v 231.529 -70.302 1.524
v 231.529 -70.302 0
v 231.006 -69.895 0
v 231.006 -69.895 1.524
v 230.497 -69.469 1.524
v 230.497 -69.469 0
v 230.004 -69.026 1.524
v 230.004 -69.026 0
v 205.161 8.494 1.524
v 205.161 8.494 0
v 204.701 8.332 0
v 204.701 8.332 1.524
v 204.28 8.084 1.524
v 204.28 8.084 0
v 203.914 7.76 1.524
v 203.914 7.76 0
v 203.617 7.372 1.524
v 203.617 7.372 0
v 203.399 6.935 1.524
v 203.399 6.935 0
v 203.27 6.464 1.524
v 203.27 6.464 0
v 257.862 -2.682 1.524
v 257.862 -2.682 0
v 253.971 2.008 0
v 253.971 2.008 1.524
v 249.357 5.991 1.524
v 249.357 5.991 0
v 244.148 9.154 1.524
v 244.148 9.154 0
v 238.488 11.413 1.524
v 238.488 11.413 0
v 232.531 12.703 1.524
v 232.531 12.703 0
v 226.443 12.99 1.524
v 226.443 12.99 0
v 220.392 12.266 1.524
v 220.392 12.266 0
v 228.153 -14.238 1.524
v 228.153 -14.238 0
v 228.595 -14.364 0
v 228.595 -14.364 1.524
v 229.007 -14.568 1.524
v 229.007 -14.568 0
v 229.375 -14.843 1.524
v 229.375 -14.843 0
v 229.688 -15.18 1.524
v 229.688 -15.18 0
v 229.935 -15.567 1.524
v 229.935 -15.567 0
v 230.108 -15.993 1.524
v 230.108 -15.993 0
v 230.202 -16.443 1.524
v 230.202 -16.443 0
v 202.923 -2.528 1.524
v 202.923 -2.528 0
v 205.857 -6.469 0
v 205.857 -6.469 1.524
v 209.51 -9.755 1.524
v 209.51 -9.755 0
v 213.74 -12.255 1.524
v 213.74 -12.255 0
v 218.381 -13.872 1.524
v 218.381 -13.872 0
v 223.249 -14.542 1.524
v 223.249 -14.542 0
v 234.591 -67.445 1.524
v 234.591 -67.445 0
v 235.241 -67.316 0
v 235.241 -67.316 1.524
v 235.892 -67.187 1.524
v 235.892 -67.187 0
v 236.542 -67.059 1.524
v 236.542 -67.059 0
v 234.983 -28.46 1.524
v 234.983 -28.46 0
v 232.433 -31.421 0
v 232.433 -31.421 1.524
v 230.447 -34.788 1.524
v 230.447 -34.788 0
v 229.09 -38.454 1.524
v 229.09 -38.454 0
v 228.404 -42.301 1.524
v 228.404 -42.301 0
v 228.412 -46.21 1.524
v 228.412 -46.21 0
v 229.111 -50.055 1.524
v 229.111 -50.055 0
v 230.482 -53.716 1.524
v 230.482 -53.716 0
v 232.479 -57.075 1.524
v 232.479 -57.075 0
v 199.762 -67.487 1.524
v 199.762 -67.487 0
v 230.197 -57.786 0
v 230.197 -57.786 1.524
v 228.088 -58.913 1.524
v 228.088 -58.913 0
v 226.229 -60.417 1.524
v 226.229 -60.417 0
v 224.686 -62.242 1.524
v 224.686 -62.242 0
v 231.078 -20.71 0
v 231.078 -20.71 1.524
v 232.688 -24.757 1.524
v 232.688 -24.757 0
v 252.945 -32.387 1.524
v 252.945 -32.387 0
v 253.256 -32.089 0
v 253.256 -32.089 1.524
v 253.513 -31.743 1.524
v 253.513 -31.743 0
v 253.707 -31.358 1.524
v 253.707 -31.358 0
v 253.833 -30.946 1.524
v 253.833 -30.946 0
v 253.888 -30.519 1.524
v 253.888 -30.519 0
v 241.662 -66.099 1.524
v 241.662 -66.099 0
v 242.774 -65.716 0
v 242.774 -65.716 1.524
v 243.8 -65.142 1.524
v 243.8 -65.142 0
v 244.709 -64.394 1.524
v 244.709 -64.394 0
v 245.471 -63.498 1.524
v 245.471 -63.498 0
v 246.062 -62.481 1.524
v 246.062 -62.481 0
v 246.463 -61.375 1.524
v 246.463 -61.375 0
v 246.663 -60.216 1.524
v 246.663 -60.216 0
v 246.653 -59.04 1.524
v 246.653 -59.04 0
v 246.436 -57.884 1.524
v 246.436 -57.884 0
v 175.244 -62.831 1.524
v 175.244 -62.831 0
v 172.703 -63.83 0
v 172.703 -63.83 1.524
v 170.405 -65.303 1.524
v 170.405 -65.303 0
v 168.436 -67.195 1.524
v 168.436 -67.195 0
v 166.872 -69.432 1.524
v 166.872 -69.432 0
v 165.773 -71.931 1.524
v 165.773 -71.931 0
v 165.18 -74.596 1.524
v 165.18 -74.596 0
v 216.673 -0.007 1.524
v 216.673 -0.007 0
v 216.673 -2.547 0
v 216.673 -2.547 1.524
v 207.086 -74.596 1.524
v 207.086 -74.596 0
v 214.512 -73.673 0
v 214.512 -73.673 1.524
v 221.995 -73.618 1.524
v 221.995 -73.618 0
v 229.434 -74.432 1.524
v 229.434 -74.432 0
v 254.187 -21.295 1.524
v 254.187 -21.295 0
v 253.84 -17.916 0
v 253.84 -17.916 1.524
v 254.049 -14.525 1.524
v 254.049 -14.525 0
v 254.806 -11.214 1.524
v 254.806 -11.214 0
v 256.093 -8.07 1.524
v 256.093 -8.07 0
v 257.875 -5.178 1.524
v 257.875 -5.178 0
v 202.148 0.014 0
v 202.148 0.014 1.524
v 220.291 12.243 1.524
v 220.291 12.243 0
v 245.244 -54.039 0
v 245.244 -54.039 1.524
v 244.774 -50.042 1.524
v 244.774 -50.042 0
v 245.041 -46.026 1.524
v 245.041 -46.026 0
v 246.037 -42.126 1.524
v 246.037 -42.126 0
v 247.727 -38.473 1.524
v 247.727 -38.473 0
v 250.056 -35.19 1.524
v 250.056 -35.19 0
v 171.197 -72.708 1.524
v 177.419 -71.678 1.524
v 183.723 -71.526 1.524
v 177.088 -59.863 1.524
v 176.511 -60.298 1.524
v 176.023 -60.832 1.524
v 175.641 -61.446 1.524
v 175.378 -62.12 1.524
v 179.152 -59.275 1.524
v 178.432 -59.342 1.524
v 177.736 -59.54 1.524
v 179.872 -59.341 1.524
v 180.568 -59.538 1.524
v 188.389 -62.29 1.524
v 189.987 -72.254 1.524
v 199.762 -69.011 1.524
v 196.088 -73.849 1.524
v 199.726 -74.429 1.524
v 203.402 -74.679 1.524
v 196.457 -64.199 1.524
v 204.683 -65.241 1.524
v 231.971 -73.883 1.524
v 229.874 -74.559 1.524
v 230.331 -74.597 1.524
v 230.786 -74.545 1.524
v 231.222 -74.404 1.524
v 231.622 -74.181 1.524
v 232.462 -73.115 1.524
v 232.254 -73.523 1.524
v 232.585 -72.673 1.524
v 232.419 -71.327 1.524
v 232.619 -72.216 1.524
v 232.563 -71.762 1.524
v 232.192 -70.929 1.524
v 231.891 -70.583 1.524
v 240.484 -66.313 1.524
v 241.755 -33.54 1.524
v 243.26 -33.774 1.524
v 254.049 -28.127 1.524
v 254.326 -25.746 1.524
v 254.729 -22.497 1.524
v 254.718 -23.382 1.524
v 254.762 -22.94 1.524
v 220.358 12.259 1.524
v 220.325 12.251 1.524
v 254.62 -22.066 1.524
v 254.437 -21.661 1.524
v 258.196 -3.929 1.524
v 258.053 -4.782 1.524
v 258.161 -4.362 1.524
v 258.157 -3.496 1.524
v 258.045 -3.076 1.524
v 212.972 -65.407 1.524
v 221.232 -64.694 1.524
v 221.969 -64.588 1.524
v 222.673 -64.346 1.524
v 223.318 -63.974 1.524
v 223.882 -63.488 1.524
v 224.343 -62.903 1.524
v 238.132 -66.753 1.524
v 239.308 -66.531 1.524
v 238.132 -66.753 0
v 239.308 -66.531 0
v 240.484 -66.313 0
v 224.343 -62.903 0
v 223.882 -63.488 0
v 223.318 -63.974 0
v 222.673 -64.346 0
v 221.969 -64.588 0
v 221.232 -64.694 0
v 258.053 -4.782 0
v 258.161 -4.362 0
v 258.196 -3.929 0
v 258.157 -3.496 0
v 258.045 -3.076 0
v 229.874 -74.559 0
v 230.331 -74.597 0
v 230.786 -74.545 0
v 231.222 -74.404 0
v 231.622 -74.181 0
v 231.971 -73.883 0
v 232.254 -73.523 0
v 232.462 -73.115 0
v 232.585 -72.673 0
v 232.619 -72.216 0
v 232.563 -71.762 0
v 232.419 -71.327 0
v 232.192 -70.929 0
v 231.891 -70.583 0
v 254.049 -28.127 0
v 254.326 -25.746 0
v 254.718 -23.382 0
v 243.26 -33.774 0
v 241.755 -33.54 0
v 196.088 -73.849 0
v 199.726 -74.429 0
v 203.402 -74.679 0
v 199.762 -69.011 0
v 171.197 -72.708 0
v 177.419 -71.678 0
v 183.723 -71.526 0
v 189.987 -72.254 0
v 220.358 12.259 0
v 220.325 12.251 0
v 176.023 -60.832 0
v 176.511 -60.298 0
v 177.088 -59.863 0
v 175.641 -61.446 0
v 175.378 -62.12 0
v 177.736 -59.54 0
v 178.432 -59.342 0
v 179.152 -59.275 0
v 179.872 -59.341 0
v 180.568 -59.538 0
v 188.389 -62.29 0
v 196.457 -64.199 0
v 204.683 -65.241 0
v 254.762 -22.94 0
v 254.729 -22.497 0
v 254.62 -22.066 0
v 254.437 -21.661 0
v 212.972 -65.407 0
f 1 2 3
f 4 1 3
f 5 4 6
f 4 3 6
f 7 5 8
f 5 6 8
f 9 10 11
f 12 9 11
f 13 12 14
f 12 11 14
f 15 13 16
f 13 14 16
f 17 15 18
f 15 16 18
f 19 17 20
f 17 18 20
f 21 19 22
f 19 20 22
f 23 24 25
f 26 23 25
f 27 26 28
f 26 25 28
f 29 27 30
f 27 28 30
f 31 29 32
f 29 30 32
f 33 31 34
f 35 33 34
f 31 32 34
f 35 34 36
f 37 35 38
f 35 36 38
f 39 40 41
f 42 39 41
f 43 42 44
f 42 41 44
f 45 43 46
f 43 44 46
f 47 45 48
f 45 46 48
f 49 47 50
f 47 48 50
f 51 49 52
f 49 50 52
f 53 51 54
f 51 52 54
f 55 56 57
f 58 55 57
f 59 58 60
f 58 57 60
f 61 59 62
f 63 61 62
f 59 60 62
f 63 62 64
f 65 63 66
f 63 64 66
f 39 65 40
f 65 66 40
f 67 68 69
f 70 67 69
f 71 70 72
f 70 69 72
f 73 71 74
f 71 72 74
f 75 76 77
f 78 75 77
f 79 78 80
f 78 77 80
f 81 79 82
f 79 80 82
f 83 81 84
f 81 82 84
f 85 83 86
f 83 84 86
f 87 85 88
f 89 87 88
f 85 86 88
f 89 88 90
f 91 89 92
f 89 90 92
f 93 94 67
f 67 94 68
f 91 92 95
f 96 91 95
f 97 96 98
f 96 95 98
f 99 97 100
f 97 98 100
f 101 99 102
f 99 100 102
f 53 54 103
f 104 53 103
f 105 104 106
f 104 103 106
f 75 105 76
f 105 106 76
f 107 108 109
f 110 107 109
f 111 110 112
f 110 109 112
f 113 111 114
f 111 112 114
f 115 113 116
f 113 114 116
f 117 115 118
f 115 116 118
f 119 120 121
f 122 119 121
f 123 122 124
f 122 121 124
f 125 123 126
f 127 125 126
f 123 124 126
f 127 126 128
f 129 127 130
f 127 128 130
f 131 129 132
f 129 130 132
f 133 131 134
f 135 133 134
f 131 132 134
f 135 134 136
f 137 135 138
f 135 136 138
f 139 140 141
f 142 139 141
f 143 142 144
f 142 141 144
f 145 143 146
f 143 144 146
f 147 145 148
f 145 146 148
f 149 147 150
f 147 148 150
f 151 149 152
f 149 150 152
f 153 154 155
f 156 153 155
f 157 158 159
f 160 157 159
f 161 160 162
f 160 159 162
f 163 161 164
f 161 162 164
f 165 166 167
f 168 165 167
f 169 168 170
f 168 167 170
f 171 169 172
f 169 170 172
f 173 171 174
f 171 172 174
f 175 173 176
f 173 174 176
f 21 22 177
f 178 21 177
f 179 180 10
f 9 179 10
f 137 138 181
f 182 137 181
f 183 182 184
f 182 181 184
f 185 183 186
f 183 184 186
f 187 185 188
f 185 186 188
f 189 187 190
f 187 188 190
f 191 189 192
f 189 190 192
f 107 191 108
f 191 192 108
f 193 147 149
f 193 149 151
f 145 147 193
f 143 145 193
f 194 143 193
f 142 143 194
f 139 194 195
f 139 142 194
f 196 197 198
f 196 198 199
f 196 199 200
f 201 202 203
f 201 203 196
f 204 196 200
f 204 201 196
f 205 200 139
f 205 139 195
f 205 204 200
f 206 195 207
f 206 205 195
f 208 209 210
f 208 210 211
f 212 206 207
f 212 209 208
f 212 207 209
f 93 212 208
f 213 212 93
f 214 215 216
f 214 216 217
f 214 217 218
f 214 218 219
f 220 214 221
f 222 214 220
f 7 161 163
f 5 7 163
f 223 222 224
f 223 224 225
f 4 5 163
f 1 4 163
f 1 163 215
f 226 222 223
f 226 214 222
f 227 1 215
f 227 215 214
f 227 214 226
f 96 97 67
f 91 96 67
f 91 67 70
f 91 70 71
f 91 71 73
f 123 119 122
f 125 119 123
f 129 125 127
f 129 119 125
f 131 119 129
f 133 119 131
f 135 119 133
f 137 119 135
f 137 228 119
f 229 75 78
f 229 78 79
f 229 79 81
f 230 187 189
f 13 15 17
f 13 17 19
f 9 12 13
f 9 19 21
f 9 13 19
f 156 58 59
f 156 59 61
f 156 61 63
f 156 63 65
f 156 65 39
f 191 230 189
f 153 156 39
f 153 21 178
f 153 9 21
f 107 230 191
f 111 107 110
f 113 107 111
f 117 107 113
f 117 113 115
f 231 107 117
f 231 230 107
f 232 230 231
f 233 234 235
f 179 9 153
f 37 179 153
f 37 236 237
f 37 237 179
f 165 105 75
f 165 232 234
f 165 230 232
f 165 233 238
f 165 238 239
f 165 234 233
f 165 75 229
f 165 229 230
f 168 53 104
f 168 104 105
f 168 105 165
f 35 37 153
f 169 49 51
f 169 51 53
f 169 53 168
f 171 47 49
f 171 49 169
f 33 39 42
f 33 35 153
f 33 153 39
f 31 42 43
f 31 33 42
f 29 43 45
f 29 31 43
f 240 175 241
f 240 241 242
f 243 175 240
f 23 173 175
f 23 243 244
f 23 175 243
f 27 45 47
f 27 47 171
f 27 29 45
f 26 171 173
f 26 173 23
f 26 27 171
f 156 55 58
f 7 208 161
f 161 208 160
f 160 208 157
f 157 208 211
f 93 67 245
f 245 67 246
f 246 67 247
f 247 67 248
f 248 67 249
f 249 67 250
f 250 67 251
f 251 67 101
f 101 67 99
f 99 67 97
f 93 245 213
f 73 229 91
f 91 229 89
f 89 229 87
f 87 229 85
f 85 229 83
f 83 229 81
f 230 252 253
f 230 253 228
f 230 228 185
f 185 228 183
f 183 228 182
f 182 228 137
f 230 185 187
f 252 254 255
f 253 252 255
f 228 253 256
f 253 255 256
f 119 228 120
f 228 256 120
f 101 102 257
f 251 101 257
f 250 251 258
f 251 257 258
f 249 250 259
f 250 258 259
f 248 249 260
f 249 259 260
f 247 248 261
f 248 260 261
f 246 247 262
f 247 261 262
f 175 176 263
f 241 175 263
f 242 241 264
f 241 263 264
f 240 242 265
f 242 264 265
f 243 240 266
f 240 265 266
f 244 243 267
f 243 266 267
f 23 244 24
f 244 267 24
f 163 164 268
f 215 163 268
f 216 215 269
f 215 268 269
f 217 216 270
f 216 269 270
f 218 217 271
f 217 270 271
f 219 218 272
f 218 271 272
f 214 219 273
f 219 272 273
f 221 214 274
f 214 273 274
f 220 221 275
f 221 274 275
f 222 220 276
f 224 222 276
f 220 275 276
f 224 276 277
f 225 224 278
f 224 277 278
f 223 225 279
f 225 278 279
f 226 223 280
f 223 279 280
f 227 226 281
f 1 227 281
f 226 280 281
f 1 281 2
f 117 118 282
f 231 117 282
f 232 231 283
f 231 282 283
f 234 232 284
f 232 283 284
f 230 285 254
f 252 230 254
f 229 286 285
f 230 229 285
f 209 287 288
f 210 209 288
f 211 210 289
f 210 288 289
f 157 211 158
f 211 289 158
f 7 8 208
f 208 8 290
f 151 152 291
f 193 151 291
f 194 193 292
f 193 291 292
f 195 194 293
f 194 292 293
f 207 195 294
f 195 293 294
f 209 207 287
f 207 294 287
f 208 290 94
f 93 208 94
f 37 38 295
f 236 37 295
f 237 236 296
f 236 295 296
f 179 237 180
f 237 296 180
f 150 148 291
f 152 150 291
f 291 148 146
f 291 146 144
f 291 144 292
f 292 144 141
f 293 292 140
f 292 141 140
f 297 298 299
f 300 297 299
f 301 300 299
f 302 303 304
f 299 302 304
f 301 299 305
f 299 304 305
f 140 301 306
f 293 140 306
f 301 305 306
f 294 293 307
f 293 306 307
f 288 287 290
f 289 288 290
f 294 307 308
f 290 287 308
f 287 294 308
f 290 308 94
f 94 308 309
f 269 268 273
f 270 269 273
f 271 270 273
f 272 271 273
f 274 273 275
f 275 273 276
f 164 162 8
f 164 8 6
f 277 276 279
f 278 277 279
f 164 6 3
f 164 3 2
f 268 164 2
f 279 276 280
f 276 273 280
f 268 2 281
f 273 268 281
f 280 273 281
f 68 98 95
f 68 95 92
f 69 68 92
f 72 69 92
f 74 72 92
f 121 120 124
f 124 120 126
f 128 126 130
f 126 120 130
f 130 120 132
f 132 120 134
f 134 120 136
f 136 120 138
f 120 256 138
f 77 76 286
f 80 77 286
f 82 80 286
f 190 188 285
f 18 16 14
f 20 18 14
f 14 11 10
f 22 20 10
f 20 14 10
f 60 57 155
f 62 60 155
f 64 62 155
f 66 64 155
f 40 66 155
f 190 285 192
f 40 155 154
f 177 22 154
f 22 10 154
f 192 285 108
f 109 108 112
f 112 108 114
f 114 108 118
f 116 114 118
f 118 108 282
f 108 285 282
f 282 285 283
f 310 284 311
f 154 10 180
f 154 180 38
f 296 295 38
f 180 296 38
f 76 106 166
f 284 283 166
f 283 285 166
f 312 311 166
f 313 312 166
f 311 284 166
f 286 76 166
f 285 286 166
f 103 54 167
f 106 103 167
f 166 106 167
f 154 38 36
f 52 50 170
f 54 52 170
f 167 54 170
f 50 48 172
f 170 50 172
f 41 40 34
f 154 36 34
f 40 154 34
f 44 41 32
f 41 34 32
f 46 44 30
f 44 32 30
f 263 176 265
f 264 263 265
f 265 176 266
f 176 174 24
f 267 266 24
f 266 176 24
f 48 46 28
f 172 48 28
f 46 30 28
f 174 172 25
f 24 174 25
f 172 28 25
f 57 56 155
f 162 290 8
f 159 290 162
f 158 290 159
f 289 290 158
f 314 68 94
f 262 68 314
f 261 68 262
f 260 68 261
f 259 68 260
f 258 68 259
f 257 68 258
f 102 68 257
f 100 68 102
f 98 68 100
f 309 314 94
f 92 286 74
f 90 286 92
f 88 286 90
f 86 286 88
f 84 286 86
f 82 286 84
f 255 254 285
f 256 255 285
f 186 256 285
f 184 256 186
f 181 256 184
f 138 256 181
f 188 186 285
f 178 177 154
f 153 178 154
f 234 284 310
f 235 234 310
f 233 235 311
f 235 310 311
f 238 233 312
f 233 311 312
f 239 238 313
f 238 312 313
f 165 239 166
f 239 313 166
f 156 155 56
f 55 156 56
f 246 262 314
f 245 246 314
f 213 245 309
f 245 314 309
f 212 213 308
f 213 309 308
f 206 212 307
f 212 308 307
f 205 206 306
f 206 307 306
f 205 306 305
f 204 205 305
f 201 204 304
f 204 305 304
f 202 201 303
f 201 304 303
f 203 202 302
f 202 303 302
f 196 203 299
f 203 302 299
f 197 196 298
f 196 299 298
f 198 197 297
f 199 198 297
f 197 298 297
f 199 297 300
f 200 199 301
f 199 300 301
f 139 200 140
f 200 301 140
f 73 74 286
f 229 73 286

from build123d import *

# Parameters (mm, degrees)
BOSS_EXTRUDE1_DEPTH = 1.524


with BuildPart() as part:
    # Sketch1 → Boss-Extrude1 (new body)
    with BuildSketch(Plane.XY):
        with BuildLine():
            Line((216.672701746, -0.007446462), (216.672701746, -2.547446462))
            Line((216.672701746, -2.547446462), (202.922883793, -2.527561419))
            ThreePointArc((202.922883793, -2.527561419), (213.740389033, -12.255488314), (228.152940708, -14.237743463))
            ThreePointArc((228.152940708, -14.237743463), (229.539309592, -15.004139991), (230.201920973, -16.443003598))
            ThreePointArc((230.201920973, -16.443003598), (231.794065838, -22.769182164), (234.983138477, -28.459988454))
            ThreePointArc((234.983138477, -28.459988454), (228.404400606, -42.301387702), (232.479424339, -57.074955542))
            ThreePointArc((232.479424339, -57.074955542), (228.088258842, -58.913193865), (224.685678773, -62.242443545))
            ThreePointArc((224.685678773, -62.242443545), (223.318434752, -63.974353777), (221.232380668, -64.693553069))
            ThreePointArc((221.232380668, -64.693553069), (200.556241101, -64.829244423), (180.56810467, -59.538161211))
            ThreePointArc((180.56810467, -59.538161211), (177.088182276, -59.862533625), (175.243626571, -62.831151415))
            ThreePointArc((175.243626571, -62.831151415), (168.436022627, -67.194555572), (165.179908551, -74.595939794))
            ThreePointArc((165.179908551, -74.595939794), (180.56810467, -71.491688256), (196.088301261, -73.848901695))
            ThreePointArc((196.088301261, -73.848901695), (201.561550117, -74.595878453), (207.085536659, -74.595939794))
            ThreePointArc((207.085536659, -74.595939794), (218.25265241, -73.536219791), (229.434140266, -74.431658236))
            ThreePointArc((229.434140266, -74.431658236), (232.368160186, -73.324137561), (231.528773962, -70.302464895))
            ThreePointArc((231.528773962, -70.302464895), (230.749723909, -69.684443769), (230.004496974, -69.026032112))
            Line((230.004496974, -69.026032112), (199.761798891, -69.011393679))
            Line((199.761798891, -69.011393679), (199.761798891, -67.487393679))
            Line((199.761798891, -67.487393679), (234.591320158, -67.44538381))
            ThreePointArc((234.591320158, -67.44538381), (235.566450517, -67.25102819), (236.542114519, -67.059369434))
            Line((236.542114519, -67.059369434), (241.754501837, -33.540074699))
            Line((241.754501837, -33.540074699), (243.260404343, -33.774248693))
            Line((243.260404343, -33.774248693), (238.132067507, -66.75304007))
            ThreePointArc((238.132067507, -66.75304007), (239.89605254, -66.421852491), (241.661668499, -66.099472755))
            ThreePointArc((241.661668499, -66.099472755), (245.789044159, -63.002771973), (246.435787058, -57.883542618))
            ThreePointArc((246.435787058, -57.883542618), (245.449591498, -44.052865168), (252.944866234, -32.387485746))
            ThreePointArc((252.944866234, -32.387485746), (253.618048182, -31.554800294), (253.888271711, -30.518693039))
            ThreePointArc((253.888271711, -30.518693039), (254.1727268, -26.934998032), (254.717509197, -23.381549463))
            ThreePointArc((254.717509197, -23.381549463), (254.684120067, -22.279090661), (254.186569515, -21.294726048))
            ThreePointArc((254.186569515, -21.294726048), (254.359804188, -12.854167351), (257.874930037, -5.178430798))
            ThreePointArc((257.874930037, -5.178430798), (258.196394426, -3.928637169), (257.862228141, -2.682179643))
            ThreePointArc((257.862228141, -2.682179643), (241.364921289, 10.401189736), (220.392134228, 12.266100085))
            ThreePointArc((220.392134228, 12.266100085), (220.341626443, 12.255208572), (220.291350651, 12.243291934))
            Line((220.291350651, 12.243291934), (205.161370791, 8.494168867))
            ThreePointArc((205.161370791, 8.494168867), (203.913862316, 7.760159754), (203.269847057, 6.463899318))
            Line((203.269847057, 6.463899318), (202.1481549, 0.013558997))
            Line((202.1481549, 0.013558997), (216.672701746, -0.007446462))
        make_face()
    extrude(amount=BOSS_EXTRUDE1_DEPTH)


solid = part.part
